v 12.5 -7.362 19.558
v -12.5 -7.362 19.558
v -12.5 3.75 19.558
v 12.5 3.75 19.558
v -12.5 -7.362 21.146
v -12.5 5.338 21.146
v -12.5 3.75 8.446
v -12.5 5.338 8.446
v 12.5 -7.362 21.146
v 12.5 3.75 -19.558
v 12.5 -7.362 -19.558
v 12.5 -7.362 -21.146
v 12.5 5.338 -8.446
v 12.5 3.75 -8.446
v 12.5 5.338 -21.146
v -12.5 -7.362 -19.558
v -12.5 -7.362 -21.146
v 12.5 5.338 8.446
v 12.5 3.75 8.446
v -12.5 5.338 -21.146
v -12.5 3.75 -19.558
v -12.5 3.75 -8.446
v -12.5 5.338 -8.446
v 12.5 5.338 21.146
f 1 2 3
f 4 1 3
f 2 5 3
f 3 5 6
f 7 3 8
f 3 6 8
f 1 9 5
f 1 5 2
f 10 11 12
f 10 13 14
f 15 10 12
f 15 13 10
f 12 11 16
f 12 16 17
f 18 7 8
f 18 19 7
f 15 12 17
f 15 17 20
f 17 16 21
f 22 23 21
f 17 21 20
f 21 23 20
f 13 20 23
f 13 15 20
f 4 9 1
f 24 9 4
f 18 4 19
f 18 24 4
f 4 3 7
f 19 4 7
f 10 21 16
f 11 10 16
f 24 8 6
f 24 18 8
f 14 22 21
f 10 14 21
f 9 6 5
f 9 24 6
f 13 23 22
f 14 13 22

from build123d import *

# Parameters (mm, degrees)
BOSS_EXTRUDE1_DEPTH   = 12.5
BOSS_EXTRUDE1_2_DEPTH = 12.5


with BuildPart() as part:
    # Sketch2 → Boss-Extrude1 (new body, symmetric)
    with BuildSketch(Plane(origin=(0, 0, 0), x_dir=(0, 0, -1), z_dir=(1, 0, 0))):
        Polygon((8.4455, 3.75), (19.558, 3.75), (19.558, -7.3625), (21.1455, -7.3625), (21.1455, 5.3375), (8.4455, 5.3375), align=None)
    extrude(amount=BOSS_EXTRUDE1_DEPTH, both=True)


with BuildPart() as body_2:
    # Sketch2 → Boss-Extrude1 2 (new body, symmetric)
    with BuildSketch(Plane(origin=(0, 0, 0), x_dir=(0, 0, -1), z_dir=(1, 0, 0))):
        Polygon((-21.1455, 5.3375), (-21.1455, -7.3625), (-19.558, -7.3625), (-19.558, 3.75), (-8.4455, 3.75), (-8.4455, 5.3375), align=None)
    extrude(amount=BOSS_EXTRUDE1_2_DEPTH, both=True)


solid = Compound([part.part, body_2.part])
